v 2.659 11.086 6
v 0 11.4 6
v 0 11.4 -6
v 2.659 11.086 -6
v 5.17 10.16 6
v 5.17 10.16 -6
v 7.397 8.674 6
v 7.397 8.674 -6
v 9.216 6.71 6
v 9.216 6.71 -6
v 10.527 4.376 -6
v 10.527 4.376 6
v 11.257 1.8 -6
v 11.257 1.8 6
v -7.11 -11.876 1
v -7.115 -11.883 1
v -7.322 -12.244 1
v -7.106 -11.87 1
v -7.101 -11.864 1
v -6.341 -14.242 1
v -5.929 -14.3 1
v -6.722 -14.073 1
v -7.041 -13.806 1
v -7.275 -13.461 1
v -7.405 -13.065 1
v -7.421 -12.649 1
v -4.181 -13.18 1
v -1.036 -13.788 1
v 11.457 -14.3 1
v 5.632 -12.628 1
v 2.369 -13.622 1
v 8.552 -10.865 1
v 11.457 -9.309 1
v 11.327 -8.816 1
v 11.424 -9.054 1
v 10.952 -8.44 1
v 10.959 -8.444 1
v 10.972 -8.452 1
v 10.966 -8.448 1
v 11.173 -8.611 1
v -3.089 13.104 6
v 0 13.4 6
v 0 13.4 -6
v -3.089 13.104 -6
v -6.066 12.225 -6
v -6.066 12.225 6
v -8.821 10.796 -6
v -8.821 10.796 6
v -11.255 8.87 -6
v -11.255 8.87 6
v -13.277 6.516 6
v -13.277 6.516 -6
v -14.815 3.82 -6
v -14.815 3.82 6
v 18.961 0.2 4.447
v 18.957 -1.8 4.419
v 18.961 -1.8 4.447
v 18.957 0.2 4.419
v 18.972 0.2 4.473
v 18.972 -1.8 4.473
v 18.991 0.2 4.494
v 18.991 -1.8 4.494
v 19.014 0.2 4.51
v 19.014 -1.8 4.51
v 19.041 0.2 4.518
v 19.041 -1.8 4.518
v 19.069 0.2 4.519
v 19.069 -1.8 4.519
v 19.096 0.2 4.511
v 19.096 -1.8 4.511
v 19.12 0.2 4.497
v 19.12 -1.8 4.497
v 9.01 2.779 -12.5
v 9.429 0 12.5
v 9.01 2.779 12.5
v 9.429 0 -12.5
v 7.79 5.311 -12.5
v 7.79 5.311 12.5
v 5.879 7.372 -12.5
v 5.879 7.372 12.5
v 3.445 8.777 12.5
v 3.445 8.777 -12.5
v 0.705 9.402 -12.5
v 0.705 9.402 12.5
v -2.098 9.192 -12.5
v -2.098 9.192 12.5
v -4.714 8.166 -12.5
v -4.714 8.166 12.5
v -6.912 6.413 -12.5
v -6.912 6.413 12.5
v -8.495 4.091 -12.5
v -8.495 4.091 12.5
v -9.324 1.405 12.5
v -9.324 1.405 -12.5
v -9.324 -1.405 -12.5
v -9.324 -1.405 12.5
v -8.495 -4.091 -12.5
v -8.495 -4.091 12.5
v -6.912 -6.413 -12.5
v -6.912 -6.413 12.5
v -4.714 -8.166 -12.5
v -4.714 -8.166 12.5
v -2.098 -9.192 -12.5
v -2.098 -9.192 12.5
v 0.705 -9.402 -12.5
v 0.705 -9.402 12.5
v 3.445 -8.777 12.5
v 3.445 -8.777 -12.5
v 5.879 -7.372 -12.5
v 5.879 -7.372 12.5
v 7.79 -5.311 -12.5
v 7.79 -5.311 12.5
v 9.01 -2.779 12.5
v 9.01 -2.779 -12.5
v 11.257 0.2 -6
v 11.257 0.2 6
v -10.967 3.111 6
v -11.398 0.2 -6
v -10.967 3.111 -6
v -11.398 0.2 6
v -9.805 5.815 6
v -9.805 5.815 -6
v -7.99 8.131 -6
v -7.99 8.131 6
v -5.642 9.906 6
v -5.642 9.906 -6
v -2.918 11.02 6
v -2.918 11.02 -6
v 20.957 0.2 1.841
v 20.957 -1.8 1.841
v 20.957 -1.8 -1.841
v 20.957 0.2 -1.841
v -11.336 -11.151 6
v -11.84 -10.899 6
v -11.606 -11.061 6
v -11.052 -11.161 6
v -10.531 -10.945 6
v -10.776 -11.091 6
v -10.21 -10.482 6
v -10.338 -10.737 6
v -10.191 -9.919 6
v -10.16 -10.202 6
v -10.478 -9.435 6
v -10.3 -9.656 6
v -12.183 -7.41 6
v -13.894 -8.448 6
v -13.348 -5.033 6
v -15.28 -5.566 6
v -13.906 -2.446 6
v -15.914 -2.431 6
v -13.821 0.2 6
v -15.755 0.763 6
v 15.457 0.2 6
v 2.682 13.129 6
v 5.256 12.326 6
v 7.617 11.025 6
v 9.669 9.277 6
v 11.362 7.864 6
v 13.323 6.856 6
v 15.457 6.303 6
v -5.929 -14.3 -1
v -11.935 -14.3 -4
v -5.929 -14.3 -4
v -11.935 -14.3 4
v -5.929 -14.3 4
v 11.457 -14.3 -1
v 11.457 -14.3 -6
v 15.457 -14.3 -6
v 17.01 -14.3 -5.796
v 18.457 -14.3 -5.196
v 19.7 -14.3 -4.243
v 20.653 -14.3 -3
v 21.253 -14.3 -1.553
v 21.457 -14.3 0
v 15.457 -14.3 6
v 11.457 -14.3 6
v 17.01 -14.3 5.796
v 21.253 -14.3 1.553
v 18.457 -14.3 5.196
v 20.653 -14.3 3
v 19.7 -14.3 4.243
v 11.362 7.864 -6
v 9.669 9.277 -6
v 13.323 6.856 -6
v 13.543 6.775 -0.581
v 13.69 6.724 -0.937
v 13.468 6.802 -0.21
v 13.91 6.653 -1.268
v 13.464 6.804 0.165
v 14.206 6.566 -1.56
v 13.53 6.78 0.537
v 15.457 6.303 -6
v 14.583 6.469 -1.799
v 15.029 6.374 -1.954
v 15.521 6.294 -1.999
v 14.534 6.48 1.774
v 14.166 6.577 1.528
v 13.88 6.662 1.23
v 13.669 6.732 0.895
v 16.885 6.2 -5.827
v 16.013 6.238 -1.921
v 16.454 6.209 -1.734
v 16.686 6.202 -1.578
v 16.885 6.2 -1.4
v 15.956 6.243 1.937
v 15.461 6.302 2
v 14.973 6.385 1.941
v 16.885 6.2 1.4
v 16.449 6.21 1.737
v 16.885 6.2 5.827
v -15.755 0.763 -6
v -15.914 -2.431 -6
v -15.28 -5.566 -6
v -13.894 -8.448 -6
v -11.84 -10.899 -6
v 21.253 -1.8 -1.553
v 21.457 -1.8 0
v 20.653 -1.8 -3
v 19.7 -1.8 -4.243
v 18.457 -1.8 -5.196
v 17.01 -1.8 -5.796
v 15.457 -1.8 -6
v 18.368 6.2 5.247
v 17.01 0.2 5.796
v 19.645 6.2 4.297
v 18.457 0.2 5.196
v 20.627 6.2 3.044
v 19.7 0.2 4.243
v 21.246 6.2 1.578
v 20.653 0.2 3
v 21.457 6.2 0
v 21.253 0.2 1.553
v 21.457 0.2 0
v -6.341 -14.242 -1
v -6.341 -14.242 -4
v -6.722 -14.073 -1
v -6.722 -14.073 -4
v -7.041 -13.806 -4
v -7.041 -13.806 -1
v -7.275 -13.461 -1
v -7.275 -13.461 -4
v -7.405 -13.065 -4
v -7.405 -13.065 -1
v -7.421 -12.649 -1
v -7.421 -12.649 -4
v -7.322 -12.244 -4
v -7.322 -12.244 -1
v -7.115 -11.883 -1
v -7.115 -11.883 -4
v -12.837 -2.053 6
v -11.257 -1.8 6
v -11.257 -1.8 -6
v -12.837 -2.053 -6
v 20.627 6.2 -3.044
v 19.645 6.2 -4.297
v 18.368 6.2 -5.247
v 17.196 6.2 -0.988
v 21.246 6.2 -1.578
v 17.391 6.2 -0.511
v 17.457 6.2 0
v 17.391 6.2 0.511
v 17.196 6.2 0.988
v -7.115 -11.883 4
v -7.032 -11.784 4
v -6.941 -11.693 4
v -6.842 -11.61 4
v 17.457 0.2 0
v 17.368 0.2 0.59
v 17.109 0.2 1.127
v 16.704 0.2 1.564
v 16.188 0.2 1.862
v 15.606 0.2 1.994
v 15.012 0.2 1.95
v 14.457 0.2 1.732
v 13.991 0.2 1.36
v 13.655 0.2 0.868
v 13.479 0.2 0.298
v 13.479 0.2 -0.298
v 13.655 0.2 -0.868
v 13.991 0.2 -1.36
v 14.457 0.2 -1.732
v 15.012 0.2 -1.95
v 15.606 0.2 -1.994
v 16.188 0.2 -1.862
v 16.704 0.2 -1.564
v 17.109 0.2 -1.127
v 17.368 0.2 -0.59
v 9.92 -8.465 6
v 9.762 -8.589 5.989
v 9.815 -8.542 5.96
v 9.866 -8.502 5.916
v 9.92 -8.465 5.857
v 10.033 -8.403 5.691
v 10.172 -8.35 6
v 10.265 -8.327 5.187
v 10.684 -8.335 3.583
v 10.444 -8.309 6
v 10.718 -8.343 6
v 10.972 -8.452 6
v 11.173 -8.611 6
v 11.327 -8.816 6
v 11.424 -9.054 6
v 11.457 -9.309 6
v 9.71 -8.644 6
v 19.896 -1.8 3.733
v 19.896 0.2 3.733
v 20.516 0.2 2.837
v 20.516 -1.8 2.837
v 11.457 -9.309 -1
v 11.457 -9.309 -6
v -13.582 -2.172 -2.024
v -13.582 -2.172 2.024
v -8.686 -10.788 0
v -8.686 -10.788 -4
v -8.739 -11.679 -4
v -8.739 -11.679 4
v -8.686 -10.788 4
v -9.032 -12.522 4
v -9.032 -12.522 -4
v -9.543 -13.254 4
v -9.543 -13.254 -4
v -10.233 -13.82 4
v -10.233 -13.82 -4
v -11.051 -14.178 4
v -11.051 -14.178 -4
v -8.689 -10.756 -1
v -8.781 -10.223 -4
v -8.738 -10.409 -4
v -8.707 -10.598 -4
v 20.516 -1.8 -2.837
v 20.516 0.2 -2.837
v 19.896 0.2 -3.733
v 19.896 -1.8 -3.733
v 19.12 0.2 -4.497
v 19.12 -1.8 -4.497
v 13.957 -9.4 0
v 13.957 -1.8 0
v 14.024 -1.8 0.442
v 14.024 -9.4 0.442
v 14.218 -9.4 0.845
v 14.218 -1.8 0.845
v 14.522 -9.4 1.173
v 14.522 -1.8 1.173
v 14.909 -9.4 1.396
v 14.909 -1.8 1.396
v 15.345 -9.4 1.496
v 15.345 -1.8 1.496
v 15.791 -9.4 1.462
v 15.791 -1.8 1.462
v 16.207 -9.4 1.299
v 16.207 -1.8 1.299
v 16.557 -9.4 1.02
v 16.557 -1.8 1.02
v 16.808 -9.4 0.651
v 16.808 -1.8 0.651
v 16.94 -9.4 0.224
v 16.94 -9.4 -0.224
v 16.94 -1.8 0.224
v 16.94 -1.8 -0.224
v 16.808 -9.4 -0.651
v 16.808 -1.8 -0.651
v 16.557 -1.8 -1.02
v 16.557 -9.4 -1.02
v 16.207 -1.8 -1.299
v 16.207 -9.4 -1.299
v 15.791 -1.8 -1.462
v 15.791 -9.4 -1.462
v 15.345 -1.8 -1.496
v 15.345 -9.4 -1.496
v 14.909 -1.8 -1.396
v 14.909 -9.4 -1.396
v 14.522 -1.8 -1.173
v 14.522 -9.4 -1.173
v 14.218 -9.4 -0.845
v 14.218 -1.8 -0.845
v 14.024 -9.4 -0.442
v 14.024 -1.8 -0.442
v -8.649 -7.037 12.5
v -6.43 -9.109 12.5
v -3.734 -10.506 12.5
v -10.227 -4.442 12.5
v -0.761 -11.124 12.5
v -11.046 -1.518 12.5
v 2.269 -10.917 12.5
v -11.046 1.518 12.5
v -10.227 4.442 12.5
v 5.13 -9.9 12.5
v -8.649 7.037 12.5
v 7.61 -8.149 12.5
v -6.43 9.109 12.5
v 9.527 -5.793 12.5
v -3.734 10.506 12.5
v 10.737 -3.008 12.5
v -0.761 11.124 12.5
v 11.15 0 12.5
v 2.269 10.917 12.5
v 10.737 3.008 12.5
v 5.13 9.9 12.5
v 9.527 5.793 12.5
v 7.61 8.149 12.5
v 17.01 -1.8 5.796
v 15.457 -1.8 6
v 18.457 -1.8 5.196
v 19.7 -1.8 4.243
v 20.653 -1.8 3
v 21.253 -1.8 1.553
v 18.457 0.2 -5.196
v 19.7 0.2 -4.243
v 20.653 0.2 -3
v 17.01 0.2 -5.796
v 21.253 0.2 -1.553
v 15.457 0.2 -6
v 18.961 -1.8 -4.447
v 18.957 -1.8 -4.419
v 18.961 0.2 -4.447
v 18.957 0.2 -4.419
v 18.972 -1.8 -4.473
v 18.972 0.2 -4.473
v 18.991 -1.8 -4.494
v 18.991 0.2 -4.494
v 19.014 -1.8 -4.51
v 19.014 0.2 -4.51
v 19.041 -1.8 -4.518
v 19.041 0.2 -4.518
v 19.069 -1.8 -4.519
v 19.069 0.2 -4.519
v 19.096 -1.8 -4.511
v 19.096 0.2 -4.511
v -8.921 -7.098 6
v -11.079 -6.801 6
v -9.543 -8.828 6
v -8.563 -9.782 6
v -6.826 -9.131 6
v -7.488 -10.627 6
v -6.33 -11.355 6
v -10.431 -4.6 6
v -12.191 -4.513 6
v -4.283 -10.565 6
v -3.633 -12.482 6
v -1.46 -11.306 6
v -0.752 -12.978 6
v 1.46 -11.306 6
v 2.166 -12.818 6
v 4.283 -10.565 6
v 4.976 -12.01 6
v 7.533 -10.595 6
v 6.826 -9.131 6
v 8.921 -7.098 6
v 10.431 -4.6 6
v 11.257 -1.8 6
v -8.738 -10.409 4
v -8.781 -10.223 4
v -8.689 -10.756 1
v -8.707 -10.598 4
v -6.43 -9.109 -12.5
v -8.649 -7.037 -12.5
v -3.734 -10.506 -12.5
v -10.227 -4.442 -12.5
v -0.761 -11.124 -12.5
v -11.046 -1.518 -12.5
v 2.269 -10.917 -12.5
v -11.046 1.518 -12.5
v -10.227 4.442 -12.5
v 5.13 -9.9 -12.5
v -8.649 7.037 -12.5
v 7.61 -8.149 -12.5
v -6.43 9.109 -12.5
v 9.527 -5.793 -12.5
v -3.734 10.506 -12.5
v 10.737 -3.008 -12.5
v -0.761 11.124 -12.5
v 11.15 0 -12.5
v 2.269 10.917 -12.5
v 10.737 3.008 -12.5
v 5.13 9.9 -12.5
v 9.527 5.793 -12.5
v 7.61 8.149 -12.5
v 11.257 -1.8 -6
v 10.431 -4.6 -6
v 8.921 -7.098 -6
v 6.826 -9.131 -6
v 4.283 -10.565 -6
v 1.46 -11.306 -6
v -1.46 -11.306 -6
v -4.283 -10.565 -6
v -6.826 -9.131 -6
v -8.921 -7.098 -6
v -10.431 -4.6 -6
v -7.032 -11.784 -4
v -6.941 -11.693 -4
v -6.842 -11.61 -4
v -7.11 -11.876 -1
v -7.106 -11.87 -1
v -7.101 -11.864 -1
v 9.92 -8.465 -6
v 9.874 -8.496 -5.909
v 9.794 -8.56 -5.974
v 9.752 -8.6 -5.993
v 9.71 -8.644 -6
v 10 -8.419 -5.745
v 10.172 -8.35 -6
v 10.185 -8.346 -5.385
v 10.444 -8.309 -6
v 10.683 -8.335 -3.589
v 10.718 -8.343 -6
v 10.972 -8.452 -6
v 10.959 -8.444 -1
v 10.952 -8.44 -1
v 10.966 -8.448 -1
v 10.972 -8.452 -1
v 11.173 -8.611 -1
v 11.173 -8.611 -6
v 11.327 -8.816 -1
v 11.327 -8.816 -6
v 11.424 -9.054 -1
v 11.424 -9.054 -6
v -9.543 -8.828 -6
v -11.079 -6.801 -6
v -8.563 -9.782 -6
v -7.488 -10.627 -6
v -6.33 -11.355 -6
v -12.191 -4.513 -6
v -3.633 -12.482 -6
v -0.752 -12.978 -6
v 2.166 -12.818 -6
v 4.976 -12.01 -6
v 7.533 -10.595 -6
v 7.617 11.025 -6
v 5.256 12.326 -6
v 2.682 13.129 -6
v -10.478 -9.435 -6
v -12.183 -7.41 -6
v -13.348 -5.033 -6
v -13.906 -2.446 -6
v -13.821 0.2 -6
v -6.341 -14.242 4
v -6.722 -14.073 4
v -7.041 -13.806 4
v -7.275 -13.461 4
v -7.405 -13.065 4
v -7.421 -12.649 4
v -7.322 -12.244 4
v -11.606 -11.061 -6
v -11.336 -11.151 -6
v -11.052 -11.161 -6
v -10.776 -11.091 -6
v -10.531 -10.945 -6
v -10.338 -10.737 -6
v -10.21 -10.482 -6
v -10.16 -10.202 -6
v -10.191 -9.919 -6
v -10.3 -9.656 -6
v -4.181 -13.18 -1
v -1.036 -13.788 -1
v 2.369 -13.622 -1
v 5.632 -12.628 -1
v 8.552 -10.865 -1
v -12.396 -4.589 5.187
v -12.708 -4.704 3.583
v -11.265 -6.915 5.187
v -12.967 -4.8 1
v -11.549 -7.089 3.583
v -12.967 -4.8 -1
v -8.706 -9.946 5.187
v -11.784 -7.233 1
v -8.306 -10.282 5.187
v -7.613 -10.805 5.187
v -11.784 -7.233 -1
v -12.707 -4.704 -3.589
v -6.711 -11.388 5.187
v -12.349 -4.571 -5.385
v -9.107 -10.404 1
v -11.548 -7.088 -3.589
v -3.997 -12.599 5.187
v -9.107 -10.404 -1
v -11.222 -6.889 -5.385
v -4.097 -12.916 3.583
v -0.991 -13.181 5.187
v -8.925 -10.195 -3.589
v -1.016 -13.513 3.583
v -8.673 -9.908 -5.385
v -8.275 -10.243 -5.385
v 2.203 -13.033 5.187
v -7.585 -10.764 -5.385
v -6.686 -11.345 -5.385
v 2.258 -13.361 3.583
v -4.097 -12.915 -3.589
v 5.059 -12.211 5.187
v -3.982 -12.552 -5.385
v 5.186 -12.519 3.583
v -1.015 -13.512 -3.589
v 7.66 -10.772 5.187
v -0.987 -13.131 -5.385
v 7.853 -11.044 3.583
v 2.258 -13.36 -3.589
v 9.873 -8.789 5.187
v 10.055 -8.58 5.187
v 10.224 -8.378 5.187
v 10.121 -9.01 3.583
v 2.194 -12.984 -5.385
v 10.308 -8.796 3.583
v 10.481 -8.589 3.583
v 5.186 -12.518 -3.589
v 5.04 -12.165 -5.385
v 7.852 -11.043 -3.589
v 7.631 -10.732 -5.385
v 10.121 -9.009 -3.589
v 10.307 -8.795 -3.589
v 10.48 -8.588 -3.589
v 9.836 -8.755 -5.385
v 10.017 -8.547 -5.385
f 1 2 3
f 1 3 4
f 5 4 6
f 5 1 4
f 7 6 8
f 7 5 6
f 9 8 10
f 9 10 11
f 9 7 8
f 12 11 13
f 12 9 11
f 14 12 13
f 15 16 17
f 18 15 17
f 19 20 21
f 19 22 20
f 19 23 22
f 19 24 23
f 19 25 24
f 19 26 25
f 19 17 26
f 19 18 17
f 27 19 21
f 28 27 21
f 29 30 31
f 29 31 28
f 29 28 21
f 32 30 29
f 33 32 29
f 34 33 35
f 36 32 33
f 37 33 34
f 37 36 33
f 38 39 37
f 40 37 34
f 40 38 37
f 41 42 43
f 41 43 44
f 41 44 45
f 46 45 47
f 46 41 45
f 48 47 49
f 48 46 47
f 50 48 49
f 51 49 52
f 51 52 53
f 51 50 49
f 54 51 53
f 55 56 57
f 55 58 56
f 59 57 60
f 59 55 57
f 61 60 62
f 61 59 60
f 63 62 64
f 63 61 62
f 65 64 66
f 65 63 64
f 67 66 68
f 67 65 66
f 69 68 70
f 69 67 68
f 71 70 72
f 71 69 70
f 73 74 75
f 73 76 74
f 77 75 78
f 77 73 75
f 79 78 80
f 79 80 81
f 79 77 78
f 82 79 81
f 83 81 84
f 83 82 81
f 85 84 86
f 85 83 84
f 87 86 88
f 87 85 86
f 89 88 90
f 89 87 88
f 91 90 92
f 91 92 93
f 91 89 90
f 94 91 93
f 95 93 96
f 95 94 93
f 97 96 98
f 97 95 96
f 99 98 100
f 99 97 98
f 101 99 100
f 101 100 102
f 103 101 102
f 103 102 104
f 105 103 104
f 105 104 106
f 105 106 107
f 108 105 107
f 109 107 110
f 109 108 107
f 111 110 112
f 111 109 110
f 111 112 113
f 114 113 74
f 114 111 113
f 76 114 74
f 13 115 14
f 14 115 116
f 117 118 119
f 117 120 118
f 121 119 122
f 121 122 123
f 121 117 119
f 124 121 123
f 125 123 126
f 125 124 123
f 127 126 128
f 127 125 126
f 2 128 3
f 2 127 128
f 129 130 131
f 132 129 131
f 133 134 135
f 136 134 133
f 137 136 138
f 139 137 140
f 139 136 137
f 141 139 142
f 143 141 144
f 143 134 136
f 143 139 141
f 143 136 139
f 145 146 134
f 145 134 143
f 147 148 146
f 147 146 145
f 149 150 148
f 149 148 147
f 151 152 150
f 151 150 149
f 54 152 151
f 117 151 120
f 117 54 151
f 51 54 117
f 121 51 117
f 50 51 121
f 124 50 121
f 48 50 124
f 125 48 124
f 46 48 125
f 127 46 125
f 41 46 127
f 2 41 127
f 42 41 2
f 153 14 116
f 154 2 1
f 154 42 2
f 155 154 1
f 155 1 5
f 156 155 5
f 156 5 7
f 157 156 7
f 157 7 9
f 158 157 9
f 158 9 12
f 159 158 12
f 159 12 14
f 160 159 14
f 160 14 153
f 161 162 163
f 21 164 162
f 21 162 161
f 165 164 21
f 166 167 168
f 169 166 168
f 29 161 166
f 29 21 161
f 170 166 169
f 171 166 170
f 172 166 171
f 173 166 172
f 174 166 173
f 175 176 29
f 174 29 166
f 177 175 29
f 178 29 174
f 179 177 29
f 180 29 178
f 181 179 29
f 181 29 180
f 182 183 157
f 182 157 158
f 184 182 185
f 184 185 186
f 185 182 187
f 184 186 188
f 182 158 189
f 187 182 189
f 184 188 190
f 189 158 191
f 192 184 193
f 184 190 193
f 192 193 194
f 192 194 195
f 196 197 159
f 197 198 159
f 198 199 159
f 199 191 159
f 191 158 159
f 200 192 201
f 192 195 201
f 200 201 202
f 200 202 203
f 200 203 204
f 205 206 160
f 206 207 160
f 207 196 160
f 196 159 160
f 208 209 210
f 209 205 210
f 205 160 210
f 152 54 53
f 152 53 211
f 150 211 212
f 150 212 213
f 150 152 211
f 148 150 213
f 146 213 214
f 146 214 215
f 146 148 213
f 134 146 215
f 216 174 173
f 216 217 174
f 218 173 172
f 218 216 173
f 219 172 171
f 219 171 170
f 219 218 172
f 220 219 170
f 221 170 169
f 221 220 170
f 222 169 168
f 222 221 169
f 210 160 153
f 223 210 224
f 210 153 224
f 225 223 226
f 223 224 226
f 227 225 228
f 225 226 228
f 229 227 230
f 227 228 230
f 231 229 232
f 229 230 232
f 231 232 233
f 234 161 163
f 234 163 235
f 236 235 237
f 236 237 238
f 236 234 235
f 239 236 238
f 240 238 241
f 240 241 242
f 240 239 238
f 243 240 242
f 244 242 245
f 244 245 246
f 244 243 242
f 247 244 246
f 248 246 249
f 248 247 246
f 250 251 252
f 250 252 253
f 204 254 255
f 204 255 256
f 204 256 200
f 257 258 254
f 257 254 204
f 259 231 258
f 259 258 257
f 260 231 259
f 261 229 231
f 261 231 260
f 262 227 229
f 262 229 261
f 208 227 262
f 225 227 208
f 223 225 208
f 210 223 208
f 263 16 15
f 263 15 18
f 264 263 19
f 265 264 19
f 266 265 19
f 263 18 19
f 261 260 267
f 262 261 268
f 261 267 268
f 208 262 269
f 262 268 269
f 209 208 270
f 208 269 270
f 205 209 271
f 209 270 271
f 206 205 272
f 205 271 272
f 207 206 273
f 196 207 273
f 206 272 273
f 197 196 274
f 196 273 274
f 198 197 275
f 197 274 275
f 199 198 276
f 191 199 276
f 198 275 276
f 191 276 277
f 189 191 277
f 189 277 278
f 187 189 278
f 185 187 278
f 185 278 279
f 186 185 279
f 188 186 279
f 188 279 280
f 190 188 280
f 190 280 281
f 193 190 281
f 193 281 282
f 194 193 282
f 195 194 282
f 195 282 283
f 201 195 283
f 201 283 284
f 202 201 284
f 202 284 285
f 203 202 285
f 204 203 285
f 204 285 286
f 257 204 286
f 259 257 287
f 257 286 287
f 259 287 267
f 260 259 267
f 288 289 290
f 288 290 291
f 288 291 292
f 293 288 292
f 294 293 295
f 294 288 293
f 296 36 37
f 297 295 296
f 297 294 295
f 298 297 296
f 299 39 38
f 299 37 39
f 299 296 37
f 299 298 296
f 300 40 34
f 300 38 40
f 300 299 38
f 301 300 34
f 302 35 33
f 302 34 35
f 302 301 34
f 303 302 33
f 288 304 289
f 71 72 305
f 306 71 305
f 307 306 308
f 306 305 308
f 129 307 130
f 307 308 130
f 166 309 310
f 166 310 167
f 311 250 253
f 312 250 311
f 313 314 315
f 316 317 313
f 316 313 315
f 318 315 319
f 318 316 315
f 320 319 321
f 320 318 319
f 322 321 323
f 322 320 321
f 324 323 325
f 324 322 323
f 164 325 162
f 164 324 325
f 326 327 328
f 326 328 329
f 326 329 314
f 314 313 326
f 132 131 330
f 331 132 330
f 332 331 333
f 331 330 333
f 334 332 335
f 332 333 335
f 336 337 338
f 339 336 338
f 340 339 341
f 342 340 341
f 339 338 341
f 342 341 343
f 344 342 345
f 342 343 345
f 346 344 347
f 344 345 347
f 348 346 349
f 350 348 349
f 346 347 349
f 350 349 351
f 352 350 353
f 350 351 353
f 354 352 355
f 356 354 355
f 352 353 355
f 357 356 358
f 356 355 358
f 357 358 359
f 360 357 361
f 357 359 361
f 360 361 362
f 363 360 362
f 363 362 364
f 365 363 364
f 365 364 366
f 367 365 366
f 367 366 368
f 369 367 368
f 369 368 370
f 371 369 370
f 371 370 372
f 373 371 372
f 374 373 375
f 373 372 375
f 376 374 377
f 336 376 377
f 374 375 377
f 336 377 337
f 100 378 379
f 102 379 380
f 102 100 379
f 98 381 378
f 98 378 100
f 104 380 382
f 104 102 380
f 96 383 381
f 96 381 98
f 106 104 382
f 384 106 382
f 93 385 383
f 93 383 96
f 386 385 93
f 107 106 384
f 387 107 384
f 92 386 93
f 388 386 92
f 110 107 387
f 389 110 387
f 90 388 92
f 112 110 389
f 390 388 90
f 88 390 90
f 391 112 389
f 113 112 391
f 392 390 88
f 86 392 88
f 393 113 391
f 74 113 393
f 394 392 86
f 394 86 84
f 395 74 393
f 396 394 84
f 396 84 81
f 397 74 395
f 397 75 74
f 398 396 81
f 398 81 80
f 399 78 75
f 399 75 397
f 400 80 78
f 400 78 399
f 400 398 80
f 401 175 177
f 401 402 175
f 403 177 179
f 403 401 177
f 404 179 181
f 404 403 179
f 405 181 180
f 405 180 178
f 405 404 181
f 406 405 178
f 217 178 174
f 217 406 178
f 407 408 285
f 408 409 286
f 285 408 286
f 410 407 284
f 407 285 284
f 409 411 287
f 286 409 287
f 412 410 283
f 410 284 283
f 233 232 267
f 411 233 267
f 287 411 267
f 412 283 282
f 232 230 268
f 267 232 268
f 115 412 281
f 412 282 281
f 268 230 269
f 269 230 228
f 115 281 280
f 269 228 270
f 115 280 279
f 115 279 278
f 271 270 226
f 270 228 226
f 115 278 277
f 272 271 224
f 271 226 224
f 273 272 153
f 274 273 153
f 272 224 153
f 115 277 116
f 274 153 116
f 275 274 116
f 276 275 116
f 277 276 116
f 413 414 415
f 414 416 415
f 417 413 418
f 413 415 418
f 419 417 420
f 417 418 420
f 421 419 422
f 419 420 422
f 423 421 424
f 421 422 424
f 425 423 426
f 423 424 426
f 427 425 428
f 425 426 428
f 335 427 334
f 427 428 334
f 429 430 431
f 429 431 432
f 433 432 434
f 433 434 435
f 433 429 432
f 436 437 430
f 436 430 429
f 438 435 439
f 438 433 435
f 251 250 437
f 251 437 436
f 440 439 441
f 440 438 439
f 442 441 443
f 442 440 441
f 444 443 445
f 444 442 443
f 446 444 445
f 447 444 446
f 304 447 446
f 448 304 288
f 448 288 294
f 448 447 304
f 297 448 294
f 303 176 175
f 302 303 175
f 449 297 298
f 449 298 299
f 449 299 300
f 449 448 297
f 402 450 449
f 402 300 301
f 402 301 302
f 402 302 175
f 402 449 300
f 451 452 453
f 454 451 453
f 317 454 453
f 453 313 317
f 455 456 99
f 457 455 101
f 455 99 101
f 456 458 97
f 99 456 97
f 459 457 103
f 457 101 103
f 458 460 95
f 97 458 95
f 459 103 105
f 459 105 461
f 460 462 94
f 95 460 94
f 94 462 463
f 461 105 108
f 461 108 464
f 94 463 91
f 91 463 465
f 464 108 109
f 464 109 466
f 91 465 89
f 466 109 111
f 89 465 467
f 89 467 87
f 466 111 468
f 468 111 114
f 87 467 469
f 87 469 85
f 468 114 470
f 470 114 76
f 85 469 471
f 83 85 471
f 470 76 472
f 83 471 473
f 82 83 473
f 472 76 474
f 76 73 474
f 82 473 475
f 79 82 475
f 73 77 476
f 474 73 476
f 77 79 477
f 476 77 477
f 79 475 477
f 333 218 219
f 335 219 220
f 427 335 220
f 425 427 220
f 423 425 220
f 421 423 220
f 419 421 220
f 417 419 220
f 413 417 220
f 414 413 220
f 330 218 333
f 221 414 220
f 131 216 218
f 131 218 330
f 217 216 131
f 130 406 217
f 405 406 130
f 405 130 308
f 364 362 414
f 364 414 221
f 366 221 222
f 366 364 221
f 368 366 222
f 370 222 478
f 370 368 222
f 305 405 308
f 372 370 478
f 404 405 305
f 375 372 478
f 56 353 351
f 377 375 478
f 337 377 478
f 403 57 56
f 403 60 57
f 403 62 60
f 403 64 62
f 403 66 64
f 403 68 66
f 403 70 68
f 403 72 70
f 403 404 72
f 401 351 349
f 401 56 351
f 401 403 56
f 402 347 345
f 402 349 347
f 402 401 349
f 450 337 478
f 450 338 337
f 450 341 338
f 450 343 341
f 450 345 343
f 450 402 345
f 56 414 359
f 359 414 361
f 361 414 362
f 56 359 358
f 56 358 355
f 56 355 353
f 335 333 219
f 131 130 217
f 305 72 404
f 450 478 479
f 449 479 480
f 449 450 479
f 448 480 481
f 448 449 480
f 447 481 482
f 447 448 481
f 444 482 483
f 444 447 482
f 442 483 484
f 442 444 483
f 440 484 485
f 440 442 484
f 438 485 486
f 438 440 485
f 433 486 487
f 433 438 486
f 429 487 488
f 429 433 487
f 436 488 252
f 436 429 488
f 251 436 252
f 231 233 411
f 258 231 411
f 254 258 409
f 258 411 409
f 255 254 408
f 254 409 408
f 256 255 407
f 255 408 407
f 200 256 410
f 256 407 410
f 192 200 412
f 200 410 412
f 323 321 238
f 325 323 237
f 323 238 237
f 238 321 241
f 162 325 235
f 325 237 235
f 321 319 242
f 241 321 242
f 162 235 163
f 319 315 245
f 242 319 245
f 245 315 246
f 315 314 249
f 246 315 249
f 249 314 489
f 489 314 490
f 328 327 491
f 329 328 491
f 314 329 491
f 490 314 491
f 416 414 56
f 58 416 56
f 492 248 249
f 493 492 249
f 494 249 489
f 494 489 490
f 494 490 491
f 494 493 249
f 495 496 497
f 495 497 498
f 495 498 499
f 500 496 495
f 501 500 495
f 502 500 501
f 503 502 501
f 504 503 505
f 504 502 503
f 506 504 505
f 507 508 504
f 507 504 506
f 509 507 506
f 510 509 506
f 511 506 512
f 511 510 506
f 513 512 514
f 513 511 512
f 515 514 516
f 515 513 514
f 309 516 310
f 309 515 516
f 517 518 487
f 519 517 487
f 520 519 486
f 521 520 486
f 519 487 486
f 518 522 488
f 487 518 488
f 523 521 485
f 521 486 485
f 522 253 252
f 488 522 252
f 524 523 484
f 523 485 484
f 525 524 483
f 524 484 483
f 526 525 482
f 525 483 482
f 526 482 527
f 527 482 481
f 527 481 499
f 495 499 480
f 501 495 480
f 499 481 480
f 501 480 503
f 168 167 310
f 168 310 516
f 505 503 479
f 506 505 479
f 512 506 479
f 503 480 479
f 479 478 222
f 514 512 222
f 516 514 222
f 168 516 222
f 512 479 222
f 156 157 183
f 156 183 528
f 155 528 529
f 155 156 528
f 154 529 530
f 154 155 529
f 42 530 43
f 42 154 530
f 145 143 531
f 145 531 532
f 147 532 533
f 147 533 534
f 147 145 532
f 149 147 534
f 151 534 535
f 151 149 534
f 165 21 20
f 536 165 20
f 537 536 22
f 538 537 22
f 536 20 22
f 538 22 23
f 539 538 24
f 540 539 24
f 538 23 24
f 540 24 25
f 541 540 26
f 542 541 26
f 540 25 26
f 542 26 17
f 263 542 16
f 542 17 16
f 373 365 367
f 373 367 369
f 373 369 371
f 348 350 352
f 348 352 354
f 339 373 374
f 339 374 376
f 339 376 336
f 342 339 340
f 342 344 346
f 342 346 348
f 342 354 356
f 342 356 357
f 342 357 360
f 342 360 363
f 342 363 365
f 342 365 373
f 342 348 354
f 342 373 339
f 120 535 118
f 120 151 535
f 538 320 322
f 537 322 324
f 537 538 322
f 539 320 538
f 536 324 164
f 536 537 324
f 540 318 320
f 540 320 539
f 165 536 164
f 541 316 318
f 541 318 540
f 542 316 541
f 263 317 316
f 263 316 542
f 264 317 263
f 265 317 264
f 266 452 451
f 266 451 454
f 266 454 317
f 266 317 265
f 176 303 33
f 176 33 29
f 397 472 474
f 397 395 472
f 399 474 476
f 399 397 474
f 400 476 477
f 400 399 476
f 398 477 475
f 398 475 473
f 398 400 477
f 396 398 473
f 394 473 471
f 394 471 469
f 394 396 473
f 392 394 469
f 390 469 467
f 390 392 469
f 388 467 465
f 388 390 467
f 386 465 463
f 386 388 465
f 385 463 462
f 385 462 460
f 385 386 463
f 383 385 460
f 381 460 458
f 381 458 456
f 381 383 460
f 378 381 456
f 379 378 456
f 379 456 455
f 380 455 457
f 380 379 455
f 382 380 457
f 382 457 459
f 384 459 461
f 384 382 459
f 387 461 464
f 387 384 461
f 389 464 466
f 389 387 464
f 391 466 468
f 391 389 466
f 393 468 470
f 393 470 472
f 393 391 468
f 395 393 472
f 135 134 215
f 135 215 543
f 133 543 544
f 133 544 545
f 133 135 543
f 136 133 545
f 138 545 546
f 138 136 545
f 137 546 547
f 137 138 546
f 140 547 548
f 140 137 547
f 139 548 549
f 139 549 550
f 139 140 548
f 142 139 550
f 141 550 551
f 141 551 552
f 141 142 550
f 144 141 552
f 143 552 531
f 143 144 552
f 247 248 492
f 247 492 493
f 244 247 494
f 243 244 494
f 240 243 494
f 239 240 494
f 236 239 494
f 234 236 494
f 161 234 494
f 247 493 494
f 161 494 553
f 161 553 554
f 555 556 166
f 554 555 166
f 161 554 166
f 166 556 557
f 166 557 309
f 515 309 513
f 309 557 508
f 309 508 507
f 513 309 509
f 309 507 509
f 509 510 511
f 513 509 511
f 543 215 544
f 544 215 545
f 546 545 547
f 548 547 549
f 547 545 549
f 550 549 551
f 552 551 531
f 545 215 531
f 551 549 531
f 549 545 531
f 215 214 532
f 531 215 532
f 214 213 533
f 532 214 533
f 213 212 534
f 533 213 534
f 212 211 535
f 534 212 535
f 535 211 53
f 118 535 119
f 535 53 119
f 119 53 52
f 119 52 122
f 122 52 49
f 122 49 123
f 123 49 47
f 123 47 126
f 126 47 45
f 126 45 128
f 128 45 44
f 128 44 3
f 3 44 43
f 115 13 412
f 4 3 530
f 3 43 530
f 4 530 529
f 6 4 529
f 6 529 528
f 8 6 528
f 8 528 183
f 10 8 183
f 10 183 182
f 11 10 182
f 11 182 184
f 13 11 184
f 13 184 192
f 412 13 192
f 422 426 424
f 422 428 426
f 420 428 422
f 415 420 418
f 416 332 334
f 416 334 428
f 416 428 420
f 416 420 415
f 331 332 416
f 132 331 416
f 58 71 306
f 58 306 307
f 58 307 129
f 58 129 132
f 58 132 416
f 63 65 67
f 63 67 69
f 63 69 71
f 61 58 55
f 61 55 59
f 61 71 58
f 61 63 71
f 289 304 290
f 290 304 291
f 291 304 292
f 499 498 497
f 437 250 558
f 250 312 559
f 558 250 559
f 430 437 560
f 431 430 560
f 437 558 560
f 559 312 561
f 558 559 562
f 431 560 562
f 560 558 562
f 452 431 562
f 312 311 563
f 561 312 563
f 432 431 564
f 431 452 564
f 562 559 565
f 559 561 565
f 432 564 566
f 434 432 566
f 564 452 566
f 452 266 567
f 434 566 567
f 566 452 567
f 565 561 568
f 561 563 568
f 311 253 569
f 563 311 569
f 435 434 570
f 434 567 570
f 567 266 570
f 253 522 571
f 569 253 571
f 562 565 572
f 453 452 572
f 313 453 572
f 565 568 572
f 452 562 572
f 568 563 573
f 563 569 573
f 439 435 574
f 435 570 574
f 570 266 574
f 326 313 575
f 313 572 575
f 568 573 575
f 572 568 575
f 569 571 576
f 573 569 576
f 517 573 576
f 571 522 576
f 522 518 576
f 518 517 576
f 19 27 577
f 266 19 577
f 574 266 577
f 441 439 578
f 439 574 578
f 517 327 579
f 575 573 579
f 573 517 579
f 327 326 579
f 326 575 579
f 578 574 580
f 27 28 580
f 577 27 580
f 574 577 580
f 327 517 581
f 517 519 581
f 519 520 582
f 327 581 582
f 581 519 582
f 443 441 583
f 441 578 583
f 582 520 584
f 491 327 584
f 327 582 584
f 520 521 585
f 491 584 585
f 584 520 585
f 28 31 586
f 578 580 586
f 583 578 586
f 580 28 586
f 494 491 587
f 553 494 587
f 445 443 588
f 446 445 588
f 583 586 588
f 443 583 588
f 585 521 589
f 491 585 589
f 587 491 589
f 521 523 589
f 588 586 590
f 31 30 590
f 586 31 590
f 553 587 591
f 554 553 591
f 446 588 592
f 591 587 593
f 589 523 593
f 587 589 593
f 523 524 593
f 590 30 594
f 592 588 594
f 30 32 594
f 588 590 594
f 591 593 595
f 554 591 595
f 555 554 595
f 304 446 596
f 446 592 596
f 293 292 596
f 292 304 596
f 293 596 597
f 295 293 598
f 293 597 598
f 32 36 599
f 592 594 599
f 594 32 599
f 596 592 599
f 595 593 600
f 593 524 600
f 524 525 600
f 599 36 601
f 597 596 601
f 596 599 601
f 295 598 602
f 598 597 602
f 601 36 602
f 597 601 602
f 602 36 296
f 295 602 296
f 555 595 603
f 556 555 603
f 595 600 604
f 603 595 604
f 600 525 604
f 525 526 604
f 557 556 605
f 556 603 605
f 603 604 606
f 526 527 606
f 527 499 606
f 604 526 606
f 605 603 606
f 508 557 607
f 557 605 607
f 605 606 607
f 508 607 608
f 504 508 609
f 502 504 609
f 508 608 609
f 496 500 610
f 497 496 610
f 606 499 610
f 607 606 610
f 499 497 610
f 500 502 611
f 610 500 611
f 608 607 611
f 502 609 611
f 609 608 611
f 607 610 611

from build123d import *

# Parameters (mm, degrees)
F0_R      = 11.15
F0_R_2    = 9.4288540256
F1_DEPTH  = 12.5
F4_DEPTH  = 6
F6_DEPTH  = 1
F7_DEPTH  = 4
F8_R      = 5.99999
F9_START  = 2
F9_DEPTH  = 6
F11_DEPTH = 2
F12_R     = 0.1
F10_R     = 1.5
F13_DEPTH = 7.6
F15_DEPTH = 6
F16_R     = 10
F17_R     = 2
F18_DEPTH = 25


# Not quite as in the source:
# - a fillet or chamfer is up to 0.001 mm smaller than in the source, because OpenCascade refuses the exact size


with BuildPart() as f1:
    # F0 (on Top) → F1 (new body, symmetric)
    with BuildSketch(Plane.XY):
        Circle(F0_R)
        Circle(F0_R_2, mode=Mode.SUBTRACT)
    extrude(amount=F1_DEPTH, both=True)


with BuildPart() as f4:
    # F2 (on Top) → F4 (new body, symmetric)
    with BuildSketch(Plane.XY):
        with BuildLine():
            ThreePointArc((11.2569978236, -1.8), (0, -11.4), (-11.2569978236, -1.8))
            Line((-11.2569978236, -1.8), (-12.8369273427, -2.0526315789))
            ThreePointArc((-12.8369273427, -2.0526315789), (-11.6914767069, -5.6841333915), (-9.5429207129, -8.827947908))
            ThreePointArc((-9.5429207129, -8.827947908), (-8.0364228667, -10.2184102241), (-6.3300643569, -11.3547472555))
            ThreePointArc((-6.3300643569, -11.3547472555), (2.1664427623, -12.8182107081), (9.7100694076, -8.6437579848))
            ThreePointArc((9.7100694076, -8.6437579848), (10.3065484867, -8.3200447248), (10.9723211553, -8.4516666087))
            ThreePointArc((10.9723211553, -8.4516666087), (11.3274354525, -8.8163837293), (11.4569978236, -9.3086624451))
            Line((11.4569978236, -9.3086624451), (11.4569978236, -14.3))
            Line((11.4569978236, -14.3), (21.4569978236, -14.3))
            Line((21.4569978236, -14.3), (21.4569978236, -1.8))
            Line((21.4569978236, -1.8), (11.2569978236, -1.8))
        make_face()
    extrude(amount=F4_DEPTH, both=True)

    # F5: sweep along a path in F2
    with BuildLine(Plane.XY) as f5_path:
        ThreePointArc((-13.6762648997, -2.1868421053), (-3.4117201611, -13.4232136816), (10.9723211553, -8.4516666087))
    # F3 (on Right) → F5 (sweep)
    with BuildSketch(Plane.YZ):
        with BuildLine():
            Line((-11.4, -6), (-11.4, 6))
            Line((-11.4, 6), (-13, 6))
            ThreePointArc((-13, 6), (-13.85, 0), (-13, -6))
            Line((-13, -6), (-11.4, -6))
        make_face()
    sweep(path=f5_path.line)

    # F2 (on Top) → F6 (join, symmetric)
    with BuildSketch(Plane.XY):
        with BuildLine():
            Line((-5.9285117394, -14.3), (11.4569978236, -14.3))
            Line((11.4569978236, -14.3), (11.4569978236, -9.3086624451))
            ThreePointArc((11.4569978236, -9.3086624451), (11.3274354525, -8.8163837293), (10.9723211553, -8.4516666087))
            ThreePointArc((10.9723211553, -8.4516666087), (2.5810942069, -13.6073675887), (-7.1152481611, -11.8825815211))
            ThreePointArc((-7.1152481611, -11.8825815211), (-7.2750123369, -13.4610114529), (-5.9285117394, -14.3))
        make_face()
        with BuildLine():
            ThreePointArc((9.7100694076, -8.6437579848), (2.1664427623, -12.8182107081), (-6.3300643569, -11.3547472555))
            ThreePointArc((-6.3300643569, -11.3547472555), (-6.7653616489, -11.5551376667), (-7.1152481611, -11.8825815211))
            ThreePointArc((-7.1152481611, -11.8825815211), (2.5810942069, -13.6073675887), (10.9723211553, -8.4516666087))
            ThreePointArc((10.9723211553, -8.4516666087), (10.3065484867, -8.3200447248), (9.7100694076, -8.6437579848))
        make_face()
        with BuildLine():
            ThreePointArc((-6.3300643569, -11.3547472555), (-8.0364228667, -10.2184102241), (-9.5429207129, -8.827947908))
            ThreePointArc((-9.5429207129, -8.827947908), (-8.9491796093, -9.7355161295), (-8.6861285989, -10.7876628592))
            ThreePointArc((-8.6861285989, -10.7876628592), (-7.91963311, -11.3623022052), (-7.1152481611, -11.8825815211))
            ThreePointArc((-7.1152481611, -11.8825815211), (-6.7653616489, -11.5551376667), (-6.3300643569, -11.3547472555))
        make_face()
        with BuildLine():
            ThreePointArc((-7.1152481611, -11.8825815211), (-7.91963311, -11.3623022052), (-8.6861285989, -10.7876628592))
            ThreePointArc((-8.6861285989, -10.7876628592), (-9.5428942517, -13.2540789242), (-11.9352371812, -14.3))
            Line((-11.9352371812, -14.3), (-5.9285117394, -14.3))
            ThreePointArc((-5.9285117394, -14.3), (-7.2750123369, -13.4610114529), (-7.1152481611, -11.8825815211))
        make_face()
    extrude(amount=F6_DEPTH, both=True)

    # F2 (on Top) → F7 (join, symmetric)
    with BuildSketch(Plane.XY):
        with BuildLine():
            ThreePointArc((-6.3300643569, -11.3547472555), (-8.0364228667, -10.2184102241), (-9.5429207129, -8.827947908))
            ThreePointArc((-9.5429207129, -8.827947908), (-8.9491796093, -9.7355161295), (-8.6861285989, -10.7876628592))
            ThreePointArc((-8.6861285989, -10.7876628592), (-7.91963311, -11.3623022052), (-7.1152481611, -11.8825815211))
            ThreePointArc((-7.1152481611, -11.8825815211), (-6.7653616489, -11.5551376667), (-6.3300643569, -11.3547472555))
        make_face()
        with BuildLine():
            ThreePointArc((-7.1152481611, -11.8825815211), (-7.91963311, -11.3623022052), (-8.6861285989, -10.7876628592))
            ThreePointArc((-8.6861285989, -10.7876628592), (-9.5428942517, -13.2540789242), (-11.9352371812, -14.3))
            Line((-11.9352371812, -14.3), (-5.9285117394, -14.3))
            ThreePointArc((-5.9285117394, -14.3), (-7.2750123369, -13.4610114529), (-7.1152481611, -11.8825815211))
        make_face()
    extrude(amount=F7_DEPTH, both=True)

    # F8 (radius 6 in the source; OpenCascade refuses exactly that, so slightly less here)
    f8_edges = [f4.edges().sort_by_distance(p)[0] for p in [
        (21.456998, -8.05, 6),
        (21.456998, -8.05, -6),
    ]]
    fillet(f8_edges, radius=F8_R)

    # F10 (on face) → F11 (join)
    with BuildSketch(Plane(origin=(0, -1.8, 0), x_dir=(-1, 0, 0), z_dir=(0, 1, 0))):
        with BuildLine():
            Line((-18.9569978236, -4.6249324319), (-18.9569978236, 4.6249324319))
            ThreePointArc((-18.9569978236, 4.6249324319), (-20.1673373183, 3.3841840737), (-20.9569978236, 1.841195264))
            Line((-20.9569978236, 1.841195264), (-20.9569978236, -1.841195264))
            ThreePointArc((-20.9569978236, -1.841195264), (-20.1673373183, -3.3841840737), (-18.9569978236, -4.6249324319))
        make_face()
    extrude(amount=F11_DEPTH)

    # F12
    f12_edges = [f4.edges().sort_by_distance(p)[0] for p in [
        (18.956998, -0.8, 4.624932),
        (18.956998, -0.8, -4.624932),
    ]]
    fillet(f12_edges, radius=F12_R)

    # F10 (on face) → F13 (cut)
    with BuildSketch(Plane(origin=(0, -1.8, 0), x_dir=(-1, 0, 0), z_dir=(0, 1, 0))):
        with Locations((-15.4569978236, 0)):
            Circle(F10_R)
    extrude(amount=-F13_DEPTH, mode=Mode.SUBTRACT)


with BuildPart() as f9:
    # F4_face (on face) → F9 (new body)
    with BuildSketch(Plane(origin=(15.8138062617, -1.8, 0), x_dir=(-1, 0, 0), z_dir=(0, 1, 0)).offset(F9_START)):
        with BuildLine():
            Line((-5.6431915618, 1e-05), (-5.6431915618, -1e-05))
            ThreePointArc((-5.6431915618, -1e-05), (-3.8858351779, -4.2426436161), (0.3567984382, -6))
            Line((0.3567984382, -6), (4.5568084382, -6))
            Line((4.5568084382, -6), (4.5568084382, 6))
            Line((4.5568084382, 6), (0.3567984382, 6))
            ThreePointArc((0.3567984382, 6), (-3.8858351779, 4.2426436161), (-5.6431915618, 1e-05))
        make_face()
    extrude(amount=F9_DEPTH)

    # F14 (on Top) → F15 (join, symmetric)
    with BuildSketch(Plane.XY):
        with BuildLine():
            ThreePointArc((0, 11.4), (7.9899937422, 8.1314205401), (11.398245479, 0.2))
            Line((11.398245479, 0.2), (13.3985073796, 0.2))
            ThreePointArc((13.3985073796, 0.2), (9.4042543564, 9.545679651), (0, 13.4))
            ThreePointArc((0, 13.4), (-8.8214702408, 10.7963483499), (-14.8153922738, 3.8199425569))
            ThreePointArc((-14.8153922738, 3.8199425569), (-15.6943952458, -4.017992702), (-11.8403594103, -10.8992922251))
            ThreePointArc((-11.8403594103, -10.8992922251), (-10.4270753871, -10.8480255729), (-10.4783420392, -9.4347415497))
            ThreePointArc((-10.4783420392, -9.4347415497), (-13.3483970384, -5.0332308443), (-13.8214796077, 0.2))
            ThreePointArc((-13.8214796077, 0.2), (-13.5007989075, 1.6276240681), (-12.9914994214, 2.9993239714))
            ThreePointArc((-12.9914994214, 2.9993239714), (-7.7354769561, 9.1168786164), (0, 11.4))
        make_face()
        with BuildLine():
            ThreePointArc((-11.398245479, 0.2), (-7.9899937422, 8.1314205401), (0, 11.4))
            ThreePointArc((0, 11.4), (-7.7354769561, 9.1168786164), (-12.9914994214, 2.9993239714))
            ThreePointArc((-12.9914994214, 2.9993239714), (-13.5007989075, 1.6276240681), (-13.8214796077, 0.2))
            Line((-13.8214796077, 0.2), (-11.398245479, 0.2))
        make_face()
    extrude(amount=F15_DEPTH, both=True)

    # F16
    f16_edges = [f9.edges().sort_by_distance(p)[0] for p in [
        (11.879394, 6.2, 0),
    ]]
    fillet(f16_edges, radius=F16_R)

    # F17 (on face) → F18 (cut)
    with BuildSketch(Plane.XZ.offset(-0.2)):
        with Locations((15.4569978236, 0)):
            Circle(F17_R)
    extrude(amount=-F18_DEPTH, mode=Mode.SUBTRACT)


solid = Compound([f1.part, f4.part, f9.part])
